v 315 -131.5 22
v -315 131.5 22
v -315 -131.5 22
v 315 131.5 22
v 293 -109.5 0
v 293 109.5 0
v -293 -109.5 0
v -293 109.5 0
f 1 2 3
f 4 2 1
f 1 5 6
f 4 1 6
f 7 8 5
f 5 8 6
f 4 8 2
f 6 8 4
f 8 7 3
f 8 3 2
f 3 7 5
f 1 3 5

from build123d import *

# Parameters (mm, degrees)
F0_W     = 630
F0_H     = 263
F1_DEPTH = 22
F2_SIZE  = 21.99999


# Not quite as in the source:
# - a fillet or chamfer is up to 0.001 mm smaller than in the source, because OpenCascade refuses the exact size


with BuildPart() as f1:
    # F0 (on Top) → F1 (new body)
    with BuildSketch(Plane.XY):
        Rectangle(F0_W, F0_H)
    extrude(amount=F1_DEPTH)

    # F2 (size 22 in the source; OpenCascade refuses exactly that, so slightly less here)
    f2_edges = [f1.edges().sort_by_distance(p)[0] for p in [
        (0, 131.5, 0),
        (315, 0, 0),
        (0, -131.5, 0),
        (-315, 0, 0),
    ]]
    chamfer(f2_edges, length=F2_SIZE)


solid = f1.part
